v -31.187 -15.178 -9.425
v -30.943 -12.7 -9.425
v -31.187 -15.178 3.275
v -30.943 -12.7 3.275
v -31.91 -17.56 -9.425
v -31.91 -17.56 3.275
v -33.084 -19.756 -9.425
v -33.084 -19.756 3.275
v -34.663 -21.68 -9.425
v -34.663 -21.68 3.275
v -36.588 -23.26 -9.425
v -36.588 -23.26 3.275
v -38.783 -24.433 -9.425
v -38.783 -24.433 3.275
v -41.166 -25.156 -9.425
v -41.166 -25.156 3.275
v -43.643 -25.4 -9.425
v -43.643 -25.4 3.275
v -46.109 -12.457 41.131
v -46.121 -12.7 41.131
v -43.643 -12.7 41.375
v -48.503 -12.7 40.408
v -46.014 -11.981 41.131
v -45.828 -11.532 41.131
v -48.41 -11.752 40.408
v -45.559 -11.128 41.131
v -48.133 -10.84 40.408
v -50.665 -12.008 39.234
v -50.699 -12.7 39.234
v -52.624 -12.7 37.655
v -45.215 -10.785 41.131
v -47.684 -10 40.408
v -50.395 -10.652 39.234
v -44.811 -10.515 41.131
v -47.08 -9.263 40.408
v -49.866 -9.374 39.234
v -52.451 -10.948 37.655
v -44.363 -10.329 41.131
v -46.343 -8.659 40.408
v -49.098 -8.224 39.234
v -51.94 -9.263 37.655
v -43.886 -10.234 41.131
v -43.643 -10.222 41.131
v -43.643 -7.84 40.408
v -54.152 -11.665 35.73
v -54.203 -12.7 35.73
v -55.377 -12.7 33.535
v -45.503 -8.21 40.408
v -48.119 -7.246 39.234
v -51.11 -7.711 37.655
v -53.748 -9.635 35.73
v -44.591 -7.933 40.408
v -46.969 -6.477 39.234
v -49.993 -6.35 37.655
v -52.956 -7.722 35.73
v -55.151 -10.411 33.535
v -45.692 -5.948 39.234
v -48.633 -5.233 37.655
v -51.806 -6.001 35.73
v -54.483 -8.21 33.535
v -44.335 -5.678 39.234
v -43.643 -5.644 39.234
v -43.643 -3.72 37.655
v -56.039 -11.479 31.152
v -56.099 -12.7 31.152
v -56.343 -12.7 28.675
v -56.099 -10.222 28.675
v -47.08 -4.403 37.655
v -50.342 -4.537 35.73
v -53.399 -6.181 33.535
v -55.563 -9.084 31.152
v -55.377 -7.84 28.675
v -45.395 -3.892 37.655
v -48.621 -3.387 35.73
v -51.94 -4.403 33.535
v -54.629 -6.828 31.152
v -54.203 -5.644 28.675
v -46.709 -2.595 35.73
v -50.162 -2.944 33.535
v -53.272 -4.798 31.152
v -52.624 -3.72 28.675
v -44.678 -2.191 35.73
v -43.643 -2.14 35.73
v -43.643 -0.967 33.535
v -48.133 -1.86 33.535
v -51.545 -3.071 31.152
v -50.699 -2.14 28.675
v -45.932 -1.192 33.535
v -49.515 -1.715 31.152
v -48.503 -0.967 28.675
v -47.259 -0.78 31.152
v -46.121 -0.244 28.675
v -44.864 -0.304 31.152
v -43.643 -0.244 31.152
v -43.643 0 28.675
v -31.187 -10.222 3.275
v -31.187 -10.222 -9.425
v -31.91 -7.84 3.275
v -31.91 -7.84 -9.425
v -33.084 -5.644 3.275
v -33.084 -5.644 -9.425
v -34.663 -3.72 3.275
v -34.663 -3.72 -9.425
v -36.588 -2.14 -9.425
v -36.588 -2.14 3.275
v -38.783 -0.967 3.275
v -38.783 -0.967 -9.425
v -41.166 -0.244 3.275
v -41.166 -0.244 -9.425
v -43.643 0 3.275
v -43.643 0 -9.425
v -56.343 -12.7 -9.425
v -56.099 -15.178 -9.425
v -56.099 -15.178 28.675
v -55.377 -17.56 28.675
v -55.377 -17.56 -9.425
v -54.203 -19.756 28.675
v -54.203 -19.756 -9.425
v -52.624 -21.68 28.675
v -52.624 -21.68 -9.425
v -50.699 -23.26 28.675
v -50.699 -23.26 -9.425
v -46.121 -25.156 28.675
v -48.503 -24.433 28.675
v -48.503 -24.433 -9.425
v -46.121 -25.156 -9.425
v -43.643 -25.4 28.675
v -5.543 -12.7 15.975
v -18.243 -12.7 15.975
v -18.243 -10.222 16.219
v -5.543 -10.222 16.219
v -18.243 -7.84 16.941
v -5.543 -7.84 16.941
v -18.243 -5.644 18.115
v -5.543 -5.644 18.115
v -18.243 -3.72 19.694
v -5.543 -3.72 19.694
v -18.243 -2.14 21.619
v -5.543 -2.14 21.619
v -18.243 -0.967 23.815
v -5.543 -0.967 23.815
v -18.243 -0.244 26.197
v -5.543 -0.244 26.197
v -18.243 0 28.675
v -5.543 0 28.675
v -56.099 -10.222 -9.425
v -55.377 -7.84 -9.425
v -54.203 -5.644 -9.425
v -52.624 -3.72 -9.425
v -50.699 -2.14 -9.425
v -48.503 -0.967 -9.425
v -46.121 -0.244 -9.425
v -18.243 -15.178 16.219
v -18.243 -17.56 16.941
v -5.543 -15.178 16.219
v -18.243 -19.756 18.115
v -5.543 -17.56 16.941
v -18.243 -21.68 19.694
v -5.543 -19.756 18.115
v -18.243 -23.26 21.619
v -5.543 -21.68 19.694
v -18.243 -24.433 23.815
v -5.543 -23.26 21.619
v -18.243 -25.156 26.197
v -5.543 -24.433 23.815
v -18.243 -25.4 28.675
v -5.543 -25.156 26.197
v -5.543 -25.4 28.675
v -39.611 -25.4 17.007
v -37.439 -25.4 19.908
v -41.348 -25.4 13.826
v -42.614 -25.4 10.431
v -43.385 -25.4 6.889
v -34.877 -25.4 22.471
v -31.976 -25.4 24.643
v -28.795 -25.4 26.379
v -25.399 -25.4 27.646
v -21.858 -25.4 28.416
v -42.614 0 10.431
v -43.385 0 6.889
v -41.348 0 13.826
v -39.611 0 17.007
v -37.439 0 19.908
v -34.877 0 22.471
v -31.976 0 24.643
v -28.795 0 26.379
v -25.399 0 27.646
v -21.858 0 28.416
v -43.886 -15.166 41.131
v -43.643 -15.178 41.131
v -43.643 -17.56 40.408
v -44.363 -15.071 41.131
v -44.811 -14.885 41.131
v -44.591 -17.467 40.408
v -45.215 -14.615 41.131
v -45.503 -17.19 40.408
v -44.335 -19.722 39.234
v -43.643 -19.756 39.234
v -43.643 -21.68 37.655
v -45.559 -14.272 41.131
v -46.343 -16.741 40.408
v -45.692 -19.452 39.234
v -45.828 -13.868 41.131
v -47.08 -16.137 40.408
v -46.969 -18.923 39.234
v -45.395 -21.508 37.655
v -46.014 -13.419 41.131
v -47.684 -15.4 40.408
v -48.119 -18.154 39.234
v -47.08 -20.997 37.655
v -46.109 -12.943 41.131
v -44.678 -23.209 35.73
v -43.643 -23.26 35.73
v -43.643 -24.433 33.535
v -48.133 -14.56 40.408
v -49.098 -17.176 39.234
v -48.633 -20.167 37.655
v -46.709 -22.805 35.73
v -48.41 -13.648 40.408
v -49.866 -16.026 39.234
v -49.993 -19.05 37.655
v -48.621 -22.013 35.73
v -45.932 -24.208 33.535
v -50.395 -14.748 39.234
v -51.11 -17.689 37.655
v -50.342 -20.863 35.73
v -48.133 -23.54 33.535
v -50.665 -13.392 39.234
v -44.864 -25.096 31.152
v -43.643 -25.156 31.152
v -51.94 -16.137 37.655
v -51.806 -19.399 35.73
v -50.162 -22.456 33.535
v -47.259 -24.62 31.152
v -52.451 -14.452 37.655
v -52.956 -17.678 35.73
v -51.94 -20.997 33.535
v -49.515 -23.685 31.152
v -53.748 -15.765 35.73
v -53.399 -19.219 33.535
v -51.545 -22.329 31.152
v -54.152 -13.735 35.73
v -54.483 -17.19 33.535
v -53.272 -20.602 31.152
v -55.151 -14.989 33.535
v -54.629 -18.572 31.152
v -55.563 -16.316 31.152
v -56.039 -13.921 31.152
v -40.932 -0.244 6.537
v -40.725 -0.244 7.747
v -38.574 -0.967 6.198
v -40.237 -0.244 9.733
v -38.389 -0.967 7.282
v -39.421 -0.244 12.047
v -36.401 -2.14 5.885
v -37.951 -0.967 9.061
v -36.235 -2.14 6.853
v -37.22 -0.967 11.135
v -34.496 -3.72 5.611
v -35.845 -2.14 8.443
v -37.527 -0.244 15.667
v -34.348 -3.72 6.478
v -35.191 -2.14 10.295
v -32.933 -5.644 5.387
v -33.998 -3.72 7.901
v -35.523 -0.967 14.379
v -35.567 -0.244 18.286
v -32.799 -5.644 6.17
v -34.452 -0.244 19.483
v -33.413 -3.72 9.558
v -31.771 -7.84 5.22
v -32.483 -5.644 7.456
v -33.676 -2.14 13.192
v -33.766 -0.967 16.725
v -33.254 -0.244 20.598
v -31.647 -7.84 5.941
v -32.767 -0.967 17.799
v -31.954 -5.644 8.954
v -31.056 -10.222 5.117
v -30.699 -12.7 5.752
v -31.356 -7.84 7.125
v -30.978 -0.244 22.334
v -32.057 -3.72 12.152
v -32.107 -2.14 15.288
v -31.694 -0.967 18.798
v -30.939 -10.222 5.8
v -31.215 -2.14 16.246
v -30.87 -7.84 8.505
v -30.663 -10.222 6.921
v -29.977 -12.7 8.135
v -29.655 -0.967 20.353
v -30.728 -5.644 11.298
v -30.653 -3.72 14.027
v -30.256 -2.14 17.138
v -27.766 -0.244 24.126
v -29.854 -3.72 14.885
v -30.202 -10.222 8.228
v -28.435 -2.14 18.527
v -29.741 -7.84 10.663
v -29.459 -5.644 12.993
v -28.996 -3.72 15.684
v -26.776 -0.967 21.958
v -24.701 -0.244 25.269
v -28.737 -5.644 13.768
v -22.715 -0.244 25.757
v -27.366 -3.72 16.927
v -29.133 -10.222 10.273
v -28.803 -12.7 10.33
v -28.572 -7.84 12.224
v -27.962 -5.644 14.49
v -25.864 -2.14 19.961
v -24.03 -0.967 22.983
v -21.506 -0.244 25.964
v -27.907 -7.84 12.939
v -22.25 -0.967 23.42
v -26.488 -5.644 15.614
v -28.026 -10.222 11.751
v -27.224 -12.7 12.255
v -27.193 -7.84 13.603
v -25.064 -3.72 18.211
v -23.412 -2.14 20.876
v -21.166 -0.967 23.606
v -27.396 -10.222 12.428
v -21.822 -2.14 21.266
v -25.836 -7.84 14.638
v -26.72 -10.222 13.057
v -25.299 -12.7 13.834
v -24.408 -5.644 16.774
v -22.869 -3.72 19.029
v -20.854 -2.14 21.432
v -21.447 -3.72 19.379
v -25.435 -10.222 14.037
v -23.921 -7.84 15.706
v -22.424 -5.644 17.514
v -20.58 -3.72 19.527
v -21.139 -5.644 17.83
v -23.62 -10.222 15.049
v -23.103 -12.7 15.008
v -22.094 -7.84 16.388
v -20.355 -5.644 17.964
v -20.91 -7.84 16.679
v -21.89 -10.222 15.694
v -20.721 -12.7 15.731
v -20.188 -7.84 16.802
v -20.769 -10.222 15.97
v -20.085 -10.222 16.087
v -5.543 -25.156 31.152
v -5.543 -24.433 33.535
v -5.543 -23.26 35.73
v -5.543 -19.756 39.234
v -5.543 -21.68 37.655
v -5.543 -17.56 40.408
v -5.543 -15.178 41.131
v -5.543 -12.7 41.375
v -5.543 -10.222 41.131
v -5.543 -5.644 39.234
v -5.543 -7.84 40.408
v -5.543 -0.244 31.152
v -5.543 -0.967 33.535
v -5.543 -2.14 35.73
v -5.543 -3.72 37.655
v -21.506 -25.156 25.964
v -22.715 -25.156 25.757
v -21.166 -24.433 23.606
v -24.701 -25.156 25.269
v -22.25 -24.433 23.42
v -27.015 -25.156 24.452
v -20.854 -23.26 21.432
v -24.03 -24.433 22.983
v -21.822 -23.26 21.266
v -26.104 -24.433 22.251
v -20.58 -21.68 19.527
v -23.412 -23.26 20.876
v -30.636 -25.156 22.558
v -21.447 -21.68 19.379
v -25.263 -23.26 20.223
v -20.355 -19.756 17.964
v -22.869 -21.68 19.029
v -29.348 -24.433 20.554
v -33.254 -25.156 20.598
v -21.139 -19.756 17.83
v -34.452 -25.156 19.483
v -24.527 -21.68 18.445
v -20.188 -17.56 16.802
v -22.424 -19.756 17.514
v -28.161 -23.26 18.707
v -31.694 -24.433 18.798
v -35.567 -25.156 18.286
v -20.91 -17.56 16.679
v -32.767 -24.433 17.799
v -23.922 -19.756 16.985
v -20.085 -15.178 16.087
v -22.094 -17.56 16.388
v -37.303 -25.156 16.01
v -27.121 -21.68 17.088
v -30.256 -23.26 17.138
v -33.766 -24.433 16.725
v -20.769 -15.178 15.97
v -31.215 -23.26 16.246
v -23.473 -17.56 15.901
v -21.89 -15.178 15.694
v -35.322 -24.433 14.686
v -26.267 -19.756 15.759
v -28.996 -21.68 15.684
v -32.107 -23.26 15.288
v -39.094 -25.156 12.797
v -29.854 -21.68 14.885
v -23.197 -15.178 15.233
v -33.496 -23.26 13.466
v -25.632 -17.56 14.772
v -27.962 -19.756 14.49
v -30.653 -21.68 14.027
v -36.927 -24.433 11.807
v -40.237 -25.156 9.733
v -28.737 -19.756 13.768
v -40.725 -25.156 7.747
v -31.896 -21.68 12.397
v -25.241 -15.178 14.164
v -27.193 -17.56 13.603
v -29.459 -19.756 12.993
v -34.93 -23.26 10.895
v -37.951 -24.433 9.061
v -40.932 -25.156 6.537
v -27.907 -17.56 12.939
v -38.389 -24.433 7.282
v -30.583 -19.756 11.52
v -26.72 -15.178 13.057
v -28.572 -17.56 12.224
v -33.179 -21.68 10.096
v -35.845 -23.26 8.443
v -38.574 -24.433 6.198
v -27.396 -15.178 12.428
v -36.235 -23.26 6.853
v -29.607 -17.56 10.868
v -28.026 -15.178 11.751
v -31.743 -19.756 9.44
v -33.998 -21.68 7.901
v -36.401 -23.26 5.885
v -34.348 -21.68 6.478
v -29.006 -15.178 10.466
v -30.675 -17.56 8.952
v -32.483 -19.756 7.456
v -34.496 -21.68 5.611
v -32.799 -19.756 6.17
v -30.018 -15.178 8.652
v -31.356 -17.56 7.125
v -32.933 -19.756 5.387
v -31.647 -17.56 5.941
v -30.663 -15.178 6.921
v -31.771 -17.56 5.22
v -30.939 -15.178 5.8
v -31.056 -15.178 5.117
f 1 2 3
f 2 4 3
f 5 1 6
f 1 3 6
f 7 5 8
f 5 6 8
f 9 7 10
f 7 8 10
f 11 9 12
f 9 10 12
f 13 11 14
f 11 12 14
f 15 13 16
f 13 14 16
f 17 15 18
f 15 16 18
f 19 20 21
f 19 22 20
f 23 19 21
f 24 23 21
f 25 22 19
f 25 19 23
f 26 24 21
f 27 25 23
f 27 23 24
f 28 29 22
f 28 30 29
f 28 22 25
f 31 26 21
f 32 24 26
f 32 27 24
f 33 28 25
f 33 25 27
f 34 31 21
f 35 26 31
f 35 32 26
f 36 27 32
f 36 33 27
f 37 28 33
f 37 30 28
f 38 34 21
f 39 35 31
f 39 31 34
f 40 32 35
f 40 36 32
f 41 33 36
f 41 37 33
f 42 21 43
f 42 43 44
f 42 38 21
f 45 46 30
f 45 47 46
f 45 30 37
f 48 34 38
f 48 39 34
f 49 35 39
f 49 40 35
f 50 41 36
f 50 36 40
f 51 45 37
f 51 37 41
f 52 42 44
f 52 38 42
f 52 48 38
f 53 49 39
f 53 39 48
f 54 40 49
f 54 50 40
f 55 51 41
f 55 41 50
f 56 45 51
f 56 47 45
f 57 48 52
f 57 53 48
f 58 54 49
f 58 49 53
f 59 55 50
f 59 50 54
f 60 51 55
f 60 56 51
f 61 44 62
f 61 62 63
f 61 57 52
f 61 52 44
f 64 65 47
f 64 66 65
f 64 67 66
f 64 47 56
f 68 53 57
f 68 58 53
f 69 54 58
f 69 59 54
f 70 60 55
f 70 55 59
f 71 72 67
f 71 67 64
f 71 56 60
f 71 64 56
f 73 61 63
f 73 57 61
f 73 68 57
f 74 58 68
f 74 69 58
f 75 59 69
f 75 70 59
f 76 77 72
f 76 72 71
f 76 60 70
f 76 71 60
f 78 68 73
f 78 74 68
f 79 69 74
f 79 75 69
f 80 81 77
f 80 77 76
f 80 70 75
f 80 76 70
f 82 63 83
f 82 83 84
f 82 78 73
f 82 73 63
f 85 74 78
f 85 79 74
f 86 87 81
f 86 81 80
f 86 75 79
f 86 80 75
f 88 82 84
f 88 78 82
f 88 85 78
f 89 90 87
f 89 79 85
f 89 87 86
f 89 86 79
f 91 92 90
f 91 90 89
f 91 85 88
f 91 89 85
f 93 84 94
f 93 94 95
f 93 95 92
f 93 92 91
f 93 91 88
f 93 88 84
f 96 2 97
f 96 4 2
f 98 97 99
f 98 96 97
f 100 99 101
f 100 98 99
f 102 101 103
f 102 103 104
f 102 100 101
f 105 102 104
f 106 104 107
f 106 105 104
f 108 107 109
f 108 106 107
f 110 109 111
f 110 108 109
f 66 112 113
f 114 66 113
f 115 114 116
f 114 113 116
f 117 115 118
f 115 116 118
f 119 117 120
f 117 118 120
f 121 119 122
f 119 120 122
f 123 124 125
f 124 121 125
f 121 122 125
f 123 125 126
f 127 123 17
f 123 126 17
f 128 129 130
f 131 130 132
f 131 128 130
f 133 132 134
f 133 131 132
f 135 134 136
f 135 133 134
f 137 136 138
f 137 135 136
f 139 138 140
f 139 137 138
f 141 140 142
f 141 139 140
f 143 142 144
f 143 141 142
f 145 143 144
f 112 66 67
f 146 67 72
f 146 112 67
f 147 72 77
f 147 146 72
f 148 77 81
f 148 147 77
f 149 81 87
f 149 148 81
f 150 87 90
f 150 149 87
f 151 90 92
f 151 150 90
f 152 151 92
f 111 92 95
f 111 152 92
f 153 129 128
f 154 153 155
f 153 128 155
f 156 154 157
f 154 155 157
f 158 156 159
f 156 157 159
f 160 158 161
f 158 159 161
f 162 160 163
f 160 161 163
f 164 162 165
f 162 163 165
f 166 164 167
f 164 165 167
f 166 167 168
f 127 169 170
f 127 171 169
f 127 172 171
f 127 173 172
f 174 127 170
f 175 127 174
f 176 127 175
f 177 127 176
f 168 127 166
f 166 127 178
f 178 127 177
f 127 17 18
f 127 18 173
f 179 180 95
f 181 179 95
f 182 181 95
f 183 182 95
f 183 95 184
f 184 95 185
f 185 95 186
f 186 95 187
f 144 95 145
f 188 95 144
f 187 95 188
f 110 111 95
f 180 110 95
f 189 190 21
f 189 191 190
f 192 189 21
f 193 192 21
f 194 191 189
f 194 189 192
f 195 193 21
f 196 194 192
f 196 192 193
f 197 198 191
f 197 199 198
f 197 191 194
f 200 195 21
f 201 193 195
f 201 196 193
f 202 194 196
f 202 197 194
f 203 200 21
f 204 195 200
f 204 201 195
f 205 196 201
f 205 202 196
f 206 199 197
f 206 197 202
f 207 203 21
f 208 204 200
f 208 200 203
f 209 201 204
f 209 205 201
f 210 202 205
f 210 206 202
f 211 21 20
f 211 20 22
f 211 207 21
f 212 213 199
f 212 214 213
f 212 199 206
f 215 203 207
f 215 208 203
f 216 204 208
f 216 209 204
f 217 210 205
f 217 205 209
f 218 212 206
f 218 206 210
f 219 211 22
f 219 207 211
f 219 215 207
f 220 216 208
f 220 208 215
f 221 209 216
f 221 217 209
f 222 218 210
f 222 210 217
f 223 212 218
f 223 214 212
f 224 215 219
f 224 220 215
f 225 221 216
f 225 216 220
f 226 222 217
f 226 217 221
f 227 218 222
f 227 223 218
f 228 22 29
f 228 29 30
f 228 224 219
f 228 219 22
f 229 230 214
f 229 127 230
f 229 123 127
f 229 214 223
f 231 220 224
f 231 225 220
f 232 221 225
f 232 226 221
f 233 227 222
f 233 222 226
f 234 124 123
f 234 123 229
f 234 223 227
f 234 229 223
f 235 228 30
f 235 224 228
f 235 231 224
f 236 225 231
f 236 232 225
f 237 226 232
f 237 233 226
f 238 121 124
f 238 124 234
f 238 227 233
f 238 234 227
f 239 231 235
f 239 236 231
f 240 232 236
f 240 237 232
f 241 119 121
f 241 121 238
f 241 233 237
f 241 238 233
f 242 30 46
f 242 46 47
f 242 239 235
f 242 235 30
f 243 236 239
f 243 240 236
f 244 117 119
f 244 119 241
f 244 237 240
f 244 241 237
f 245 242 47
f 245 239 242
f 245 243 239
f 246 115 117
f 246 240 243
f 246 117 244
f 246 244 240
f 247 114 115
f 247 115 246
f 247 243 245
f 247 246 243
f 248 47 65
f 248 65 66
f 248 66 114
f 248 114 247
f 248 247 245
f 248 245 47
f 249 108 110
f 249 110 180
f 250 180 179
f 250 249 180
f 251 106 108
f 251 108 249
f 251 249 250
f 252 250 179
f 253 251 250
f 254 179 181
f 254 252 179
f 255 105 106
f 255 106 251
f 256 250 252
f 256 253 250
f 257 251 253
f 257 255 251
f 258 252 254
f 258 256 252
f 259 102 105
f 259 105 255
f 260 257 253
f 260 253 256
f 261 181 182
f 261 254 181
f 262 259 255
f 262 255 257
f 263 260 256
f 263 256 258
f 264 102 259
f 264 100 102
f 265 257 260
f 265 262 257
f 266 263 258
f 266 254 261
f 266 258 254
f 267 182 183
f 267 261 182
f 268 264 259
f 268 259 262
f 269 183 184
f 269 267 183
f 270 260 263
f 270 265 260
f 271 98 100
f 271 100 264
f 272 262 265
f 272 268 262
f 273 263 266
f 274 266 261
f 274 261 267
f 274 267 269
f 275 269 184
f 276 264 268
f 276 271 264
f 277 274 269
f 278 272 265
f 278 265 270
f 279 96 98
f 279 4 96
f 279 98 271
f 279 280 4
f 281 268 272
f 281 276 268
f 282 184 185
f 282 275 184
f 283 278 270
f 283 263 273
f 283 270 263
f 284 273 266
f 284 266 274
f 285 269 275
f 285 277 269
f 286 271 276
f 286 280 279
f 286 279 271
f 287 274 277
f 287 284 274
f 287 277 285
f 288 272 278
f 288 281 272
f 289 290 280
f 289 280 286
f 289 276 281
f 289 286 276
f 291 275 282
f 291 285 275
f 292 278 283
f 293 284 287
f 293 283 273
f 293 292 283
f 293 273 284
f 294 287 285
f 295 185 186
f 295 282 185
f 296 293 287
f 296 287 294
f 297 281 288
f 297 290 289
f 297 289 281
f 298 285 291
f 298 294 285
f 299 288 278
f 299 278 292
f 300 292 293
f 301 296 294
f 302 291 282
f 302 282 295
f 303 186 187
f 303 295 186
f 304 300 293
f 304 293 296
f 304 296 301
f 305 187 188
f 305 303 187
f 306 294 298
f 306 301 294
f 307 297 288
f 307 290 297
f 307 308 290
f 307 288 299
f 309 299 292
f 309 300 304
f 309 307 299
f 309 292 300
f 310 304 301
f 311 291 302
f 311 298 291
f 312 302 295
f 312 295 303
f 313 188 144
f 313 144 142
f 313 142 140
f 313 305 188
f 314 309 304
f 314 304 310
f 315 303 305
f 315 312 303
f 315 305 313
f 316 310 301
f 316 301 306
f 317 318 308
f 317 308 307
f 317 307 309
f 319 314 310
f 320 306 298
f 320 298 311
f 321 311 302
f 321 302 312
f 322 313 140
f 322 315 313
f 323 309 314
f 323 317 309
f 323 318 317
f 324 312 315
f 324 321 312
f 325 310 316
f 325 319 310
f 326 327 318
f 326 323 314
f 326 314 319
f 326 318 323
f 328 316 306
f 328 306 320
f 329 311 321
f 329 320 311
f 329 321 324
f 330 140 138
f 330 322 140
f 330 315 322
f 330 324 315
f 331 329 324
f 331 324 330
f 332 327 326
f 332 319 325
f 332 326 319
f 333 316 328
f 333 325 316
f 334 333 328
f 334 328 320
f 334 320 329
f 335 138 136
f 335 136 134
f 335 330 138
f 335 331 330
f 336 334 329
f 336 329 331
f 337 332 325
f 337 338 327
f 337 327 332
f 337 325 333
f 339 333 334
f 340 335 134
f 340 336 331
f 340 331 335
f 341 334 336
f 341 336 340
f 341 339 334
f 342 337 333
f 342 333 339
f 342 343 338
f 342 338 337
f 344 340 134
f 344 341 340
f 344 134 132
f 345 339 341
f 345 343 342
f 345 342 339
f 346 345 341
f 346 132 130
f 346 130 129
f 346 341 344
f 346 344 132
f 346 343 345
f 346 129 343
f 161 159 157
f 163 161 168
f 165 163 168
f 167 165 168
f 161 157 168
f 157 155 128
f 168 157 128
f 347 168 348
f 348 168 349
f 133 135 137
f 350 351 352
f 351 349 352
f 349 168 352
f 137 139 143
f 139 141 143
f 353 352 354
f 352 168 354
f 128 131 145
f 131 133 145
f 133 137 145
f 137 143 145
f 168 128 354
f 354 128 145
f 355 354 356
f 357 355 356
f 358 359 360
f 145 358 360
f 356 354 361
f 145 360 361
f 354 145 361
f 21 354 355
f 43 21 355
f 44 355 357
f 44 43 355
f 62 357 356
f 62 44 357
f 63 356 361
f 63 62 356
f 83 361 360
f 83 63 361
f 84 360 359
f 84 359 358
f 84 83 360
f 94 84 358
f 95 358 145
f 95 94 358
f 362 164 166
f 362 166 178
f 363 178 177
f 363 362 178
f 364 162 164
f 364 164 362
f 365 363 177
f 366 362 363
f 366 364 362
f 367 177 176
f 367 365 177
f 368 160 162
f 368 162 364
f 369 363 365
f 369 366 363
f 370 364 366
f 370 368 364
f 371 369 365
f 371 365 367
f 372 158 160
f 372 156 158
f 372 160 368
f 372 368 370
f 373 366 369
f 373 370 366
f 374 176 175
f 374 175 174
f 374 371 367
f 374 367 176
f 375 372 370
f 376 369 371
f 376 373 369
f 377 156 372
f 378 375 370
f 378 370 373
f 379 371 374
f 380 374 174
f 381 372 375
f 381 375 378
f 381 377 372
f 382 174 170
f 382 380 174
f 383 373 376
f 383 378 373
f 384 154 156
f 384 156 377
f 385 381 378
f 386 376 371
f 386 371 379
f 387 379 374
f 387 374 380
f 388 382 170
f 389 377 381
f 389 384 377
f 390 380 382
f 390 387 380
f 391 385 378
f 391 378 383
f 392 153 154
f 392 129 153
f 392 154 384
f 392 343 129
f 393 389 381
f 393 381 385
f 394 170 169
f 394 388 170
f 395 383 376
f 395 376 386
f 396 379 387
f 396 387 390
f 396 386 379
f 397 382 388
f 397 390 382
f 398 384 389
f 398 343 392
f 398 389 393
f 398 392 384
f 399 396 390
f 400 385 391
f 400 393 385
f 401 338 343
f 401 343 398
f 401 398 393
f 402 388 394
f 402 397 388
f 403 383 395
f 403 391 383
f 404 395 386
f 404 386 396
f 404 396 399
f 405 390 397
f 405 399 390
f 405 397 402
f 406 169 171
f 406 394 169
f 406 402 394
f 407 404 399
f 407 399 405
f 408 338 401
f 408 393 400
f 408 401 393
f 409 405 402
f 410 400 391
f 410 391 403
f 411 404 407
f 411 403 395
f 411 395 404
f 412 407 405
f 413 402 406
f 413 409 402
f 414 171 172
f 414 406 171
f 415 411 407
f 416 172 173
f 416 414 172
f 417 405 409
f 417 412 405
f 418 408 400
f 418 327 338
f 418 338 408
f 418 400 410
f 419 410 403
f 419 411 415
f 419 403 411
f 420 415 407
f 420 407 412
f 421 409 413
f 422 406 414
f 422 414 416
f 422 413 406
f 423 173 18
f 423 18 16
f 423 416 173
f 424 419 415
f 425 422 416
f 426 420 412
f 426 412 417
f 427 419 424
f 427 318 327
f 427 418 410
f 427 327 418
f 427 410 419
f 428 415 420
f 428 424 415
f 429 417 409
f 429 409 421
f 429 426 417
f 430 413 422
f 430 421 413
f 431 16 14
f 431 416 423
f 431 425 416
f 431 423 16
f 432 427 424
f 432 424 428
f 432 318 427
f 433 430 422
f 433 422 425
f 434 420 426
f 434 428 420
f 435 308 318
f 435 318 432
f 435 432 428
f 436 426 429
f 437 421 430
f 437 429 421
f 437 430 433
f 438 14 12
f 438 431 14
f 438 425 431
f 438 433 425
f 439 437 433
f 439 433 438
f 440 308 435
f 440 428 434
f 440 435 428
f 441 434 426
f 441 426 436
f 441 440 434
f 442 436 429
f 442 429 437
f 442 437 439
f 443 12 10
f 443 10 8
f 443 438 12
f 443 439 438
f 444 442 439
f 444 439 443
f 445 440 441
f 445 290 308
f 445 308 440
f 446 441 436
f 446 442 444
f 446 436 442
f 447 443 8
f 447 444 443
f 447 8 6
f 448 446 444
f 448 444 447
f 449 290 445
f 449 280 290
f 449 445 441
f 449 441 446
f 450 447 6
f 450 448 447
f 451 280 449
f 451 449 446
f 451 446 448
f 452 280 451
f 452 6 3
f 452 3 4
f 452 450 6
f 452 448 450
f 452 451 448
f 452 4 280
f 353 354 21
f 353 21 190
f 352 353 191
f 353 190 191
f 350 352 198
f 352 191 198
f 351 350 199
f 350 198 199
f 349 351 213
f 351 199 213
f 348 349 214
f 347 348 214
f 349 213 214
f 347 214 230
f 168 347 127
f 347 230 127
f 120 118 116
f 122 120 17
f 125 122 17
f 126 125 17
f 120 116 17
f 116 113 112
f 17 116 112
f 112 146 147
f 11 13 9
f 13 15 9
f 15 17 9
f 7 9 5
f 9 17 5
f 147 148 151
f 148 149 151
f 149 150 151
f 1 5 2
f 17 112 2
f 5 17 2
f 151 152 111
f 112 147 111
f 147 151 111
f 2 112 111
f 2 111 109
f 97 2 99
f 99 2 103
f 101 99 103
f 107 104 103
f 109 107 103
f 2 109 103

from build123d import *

# Parameters (mm, degrees)
F0_W     = 25.4
F0_H     = 25.4
F1_DEPTH = 25.4
F2_R     = 12.69999


# Not quite as in the source:
# - a fillet or chamfer is up to 0.001 mm smaller than in the source, because OpenCascade refuses the exact size


with BuildPart() as f1:
    # F0 (on Front) → F1 (new body)
    with BuildSketch(Plane.XZ):
        Polygon((-30.9433350532, 41.3746904978), (-56.3433350532, 41.3746904978), (-56.3433350532, -9.4253095022), (-30.9433350532, -9.4253095022), (-30.9433350532, 15.9746904978), align=None)
        with Locations((-18.2433350532, 28.6746904978)):
            Rectangle(F0_W, F0_H)
    extrude(amount=F1_DEPTH)

    # F2 (radius 12.7 in the source; OpenCascade refuses exactly that, so slightly less here)
    f2_edges = [f1.edges().sort_by_distance(p)[0] for p in [
        (-56.343335, 0, 15.97469),
        (-56.343335, -25.4, 15.97469),
        (-30.943335, -25.4, 41.37469),
        (-56.343335, -12.7, 41.37469),
        (-30.943335, 0, 41.37469),
        (-18.243335, -25.4, 15.97469),
        (-30.943335, -25.4, 3.27469),
        (-30.943335, 0, 3.27469),
        (-18.243335, 0, 15.97469),
        (-30.943335, -12.7, 15.97469),
    ]]
    fillet(f2_edges, radius=F2_R)


solid = f1.part
